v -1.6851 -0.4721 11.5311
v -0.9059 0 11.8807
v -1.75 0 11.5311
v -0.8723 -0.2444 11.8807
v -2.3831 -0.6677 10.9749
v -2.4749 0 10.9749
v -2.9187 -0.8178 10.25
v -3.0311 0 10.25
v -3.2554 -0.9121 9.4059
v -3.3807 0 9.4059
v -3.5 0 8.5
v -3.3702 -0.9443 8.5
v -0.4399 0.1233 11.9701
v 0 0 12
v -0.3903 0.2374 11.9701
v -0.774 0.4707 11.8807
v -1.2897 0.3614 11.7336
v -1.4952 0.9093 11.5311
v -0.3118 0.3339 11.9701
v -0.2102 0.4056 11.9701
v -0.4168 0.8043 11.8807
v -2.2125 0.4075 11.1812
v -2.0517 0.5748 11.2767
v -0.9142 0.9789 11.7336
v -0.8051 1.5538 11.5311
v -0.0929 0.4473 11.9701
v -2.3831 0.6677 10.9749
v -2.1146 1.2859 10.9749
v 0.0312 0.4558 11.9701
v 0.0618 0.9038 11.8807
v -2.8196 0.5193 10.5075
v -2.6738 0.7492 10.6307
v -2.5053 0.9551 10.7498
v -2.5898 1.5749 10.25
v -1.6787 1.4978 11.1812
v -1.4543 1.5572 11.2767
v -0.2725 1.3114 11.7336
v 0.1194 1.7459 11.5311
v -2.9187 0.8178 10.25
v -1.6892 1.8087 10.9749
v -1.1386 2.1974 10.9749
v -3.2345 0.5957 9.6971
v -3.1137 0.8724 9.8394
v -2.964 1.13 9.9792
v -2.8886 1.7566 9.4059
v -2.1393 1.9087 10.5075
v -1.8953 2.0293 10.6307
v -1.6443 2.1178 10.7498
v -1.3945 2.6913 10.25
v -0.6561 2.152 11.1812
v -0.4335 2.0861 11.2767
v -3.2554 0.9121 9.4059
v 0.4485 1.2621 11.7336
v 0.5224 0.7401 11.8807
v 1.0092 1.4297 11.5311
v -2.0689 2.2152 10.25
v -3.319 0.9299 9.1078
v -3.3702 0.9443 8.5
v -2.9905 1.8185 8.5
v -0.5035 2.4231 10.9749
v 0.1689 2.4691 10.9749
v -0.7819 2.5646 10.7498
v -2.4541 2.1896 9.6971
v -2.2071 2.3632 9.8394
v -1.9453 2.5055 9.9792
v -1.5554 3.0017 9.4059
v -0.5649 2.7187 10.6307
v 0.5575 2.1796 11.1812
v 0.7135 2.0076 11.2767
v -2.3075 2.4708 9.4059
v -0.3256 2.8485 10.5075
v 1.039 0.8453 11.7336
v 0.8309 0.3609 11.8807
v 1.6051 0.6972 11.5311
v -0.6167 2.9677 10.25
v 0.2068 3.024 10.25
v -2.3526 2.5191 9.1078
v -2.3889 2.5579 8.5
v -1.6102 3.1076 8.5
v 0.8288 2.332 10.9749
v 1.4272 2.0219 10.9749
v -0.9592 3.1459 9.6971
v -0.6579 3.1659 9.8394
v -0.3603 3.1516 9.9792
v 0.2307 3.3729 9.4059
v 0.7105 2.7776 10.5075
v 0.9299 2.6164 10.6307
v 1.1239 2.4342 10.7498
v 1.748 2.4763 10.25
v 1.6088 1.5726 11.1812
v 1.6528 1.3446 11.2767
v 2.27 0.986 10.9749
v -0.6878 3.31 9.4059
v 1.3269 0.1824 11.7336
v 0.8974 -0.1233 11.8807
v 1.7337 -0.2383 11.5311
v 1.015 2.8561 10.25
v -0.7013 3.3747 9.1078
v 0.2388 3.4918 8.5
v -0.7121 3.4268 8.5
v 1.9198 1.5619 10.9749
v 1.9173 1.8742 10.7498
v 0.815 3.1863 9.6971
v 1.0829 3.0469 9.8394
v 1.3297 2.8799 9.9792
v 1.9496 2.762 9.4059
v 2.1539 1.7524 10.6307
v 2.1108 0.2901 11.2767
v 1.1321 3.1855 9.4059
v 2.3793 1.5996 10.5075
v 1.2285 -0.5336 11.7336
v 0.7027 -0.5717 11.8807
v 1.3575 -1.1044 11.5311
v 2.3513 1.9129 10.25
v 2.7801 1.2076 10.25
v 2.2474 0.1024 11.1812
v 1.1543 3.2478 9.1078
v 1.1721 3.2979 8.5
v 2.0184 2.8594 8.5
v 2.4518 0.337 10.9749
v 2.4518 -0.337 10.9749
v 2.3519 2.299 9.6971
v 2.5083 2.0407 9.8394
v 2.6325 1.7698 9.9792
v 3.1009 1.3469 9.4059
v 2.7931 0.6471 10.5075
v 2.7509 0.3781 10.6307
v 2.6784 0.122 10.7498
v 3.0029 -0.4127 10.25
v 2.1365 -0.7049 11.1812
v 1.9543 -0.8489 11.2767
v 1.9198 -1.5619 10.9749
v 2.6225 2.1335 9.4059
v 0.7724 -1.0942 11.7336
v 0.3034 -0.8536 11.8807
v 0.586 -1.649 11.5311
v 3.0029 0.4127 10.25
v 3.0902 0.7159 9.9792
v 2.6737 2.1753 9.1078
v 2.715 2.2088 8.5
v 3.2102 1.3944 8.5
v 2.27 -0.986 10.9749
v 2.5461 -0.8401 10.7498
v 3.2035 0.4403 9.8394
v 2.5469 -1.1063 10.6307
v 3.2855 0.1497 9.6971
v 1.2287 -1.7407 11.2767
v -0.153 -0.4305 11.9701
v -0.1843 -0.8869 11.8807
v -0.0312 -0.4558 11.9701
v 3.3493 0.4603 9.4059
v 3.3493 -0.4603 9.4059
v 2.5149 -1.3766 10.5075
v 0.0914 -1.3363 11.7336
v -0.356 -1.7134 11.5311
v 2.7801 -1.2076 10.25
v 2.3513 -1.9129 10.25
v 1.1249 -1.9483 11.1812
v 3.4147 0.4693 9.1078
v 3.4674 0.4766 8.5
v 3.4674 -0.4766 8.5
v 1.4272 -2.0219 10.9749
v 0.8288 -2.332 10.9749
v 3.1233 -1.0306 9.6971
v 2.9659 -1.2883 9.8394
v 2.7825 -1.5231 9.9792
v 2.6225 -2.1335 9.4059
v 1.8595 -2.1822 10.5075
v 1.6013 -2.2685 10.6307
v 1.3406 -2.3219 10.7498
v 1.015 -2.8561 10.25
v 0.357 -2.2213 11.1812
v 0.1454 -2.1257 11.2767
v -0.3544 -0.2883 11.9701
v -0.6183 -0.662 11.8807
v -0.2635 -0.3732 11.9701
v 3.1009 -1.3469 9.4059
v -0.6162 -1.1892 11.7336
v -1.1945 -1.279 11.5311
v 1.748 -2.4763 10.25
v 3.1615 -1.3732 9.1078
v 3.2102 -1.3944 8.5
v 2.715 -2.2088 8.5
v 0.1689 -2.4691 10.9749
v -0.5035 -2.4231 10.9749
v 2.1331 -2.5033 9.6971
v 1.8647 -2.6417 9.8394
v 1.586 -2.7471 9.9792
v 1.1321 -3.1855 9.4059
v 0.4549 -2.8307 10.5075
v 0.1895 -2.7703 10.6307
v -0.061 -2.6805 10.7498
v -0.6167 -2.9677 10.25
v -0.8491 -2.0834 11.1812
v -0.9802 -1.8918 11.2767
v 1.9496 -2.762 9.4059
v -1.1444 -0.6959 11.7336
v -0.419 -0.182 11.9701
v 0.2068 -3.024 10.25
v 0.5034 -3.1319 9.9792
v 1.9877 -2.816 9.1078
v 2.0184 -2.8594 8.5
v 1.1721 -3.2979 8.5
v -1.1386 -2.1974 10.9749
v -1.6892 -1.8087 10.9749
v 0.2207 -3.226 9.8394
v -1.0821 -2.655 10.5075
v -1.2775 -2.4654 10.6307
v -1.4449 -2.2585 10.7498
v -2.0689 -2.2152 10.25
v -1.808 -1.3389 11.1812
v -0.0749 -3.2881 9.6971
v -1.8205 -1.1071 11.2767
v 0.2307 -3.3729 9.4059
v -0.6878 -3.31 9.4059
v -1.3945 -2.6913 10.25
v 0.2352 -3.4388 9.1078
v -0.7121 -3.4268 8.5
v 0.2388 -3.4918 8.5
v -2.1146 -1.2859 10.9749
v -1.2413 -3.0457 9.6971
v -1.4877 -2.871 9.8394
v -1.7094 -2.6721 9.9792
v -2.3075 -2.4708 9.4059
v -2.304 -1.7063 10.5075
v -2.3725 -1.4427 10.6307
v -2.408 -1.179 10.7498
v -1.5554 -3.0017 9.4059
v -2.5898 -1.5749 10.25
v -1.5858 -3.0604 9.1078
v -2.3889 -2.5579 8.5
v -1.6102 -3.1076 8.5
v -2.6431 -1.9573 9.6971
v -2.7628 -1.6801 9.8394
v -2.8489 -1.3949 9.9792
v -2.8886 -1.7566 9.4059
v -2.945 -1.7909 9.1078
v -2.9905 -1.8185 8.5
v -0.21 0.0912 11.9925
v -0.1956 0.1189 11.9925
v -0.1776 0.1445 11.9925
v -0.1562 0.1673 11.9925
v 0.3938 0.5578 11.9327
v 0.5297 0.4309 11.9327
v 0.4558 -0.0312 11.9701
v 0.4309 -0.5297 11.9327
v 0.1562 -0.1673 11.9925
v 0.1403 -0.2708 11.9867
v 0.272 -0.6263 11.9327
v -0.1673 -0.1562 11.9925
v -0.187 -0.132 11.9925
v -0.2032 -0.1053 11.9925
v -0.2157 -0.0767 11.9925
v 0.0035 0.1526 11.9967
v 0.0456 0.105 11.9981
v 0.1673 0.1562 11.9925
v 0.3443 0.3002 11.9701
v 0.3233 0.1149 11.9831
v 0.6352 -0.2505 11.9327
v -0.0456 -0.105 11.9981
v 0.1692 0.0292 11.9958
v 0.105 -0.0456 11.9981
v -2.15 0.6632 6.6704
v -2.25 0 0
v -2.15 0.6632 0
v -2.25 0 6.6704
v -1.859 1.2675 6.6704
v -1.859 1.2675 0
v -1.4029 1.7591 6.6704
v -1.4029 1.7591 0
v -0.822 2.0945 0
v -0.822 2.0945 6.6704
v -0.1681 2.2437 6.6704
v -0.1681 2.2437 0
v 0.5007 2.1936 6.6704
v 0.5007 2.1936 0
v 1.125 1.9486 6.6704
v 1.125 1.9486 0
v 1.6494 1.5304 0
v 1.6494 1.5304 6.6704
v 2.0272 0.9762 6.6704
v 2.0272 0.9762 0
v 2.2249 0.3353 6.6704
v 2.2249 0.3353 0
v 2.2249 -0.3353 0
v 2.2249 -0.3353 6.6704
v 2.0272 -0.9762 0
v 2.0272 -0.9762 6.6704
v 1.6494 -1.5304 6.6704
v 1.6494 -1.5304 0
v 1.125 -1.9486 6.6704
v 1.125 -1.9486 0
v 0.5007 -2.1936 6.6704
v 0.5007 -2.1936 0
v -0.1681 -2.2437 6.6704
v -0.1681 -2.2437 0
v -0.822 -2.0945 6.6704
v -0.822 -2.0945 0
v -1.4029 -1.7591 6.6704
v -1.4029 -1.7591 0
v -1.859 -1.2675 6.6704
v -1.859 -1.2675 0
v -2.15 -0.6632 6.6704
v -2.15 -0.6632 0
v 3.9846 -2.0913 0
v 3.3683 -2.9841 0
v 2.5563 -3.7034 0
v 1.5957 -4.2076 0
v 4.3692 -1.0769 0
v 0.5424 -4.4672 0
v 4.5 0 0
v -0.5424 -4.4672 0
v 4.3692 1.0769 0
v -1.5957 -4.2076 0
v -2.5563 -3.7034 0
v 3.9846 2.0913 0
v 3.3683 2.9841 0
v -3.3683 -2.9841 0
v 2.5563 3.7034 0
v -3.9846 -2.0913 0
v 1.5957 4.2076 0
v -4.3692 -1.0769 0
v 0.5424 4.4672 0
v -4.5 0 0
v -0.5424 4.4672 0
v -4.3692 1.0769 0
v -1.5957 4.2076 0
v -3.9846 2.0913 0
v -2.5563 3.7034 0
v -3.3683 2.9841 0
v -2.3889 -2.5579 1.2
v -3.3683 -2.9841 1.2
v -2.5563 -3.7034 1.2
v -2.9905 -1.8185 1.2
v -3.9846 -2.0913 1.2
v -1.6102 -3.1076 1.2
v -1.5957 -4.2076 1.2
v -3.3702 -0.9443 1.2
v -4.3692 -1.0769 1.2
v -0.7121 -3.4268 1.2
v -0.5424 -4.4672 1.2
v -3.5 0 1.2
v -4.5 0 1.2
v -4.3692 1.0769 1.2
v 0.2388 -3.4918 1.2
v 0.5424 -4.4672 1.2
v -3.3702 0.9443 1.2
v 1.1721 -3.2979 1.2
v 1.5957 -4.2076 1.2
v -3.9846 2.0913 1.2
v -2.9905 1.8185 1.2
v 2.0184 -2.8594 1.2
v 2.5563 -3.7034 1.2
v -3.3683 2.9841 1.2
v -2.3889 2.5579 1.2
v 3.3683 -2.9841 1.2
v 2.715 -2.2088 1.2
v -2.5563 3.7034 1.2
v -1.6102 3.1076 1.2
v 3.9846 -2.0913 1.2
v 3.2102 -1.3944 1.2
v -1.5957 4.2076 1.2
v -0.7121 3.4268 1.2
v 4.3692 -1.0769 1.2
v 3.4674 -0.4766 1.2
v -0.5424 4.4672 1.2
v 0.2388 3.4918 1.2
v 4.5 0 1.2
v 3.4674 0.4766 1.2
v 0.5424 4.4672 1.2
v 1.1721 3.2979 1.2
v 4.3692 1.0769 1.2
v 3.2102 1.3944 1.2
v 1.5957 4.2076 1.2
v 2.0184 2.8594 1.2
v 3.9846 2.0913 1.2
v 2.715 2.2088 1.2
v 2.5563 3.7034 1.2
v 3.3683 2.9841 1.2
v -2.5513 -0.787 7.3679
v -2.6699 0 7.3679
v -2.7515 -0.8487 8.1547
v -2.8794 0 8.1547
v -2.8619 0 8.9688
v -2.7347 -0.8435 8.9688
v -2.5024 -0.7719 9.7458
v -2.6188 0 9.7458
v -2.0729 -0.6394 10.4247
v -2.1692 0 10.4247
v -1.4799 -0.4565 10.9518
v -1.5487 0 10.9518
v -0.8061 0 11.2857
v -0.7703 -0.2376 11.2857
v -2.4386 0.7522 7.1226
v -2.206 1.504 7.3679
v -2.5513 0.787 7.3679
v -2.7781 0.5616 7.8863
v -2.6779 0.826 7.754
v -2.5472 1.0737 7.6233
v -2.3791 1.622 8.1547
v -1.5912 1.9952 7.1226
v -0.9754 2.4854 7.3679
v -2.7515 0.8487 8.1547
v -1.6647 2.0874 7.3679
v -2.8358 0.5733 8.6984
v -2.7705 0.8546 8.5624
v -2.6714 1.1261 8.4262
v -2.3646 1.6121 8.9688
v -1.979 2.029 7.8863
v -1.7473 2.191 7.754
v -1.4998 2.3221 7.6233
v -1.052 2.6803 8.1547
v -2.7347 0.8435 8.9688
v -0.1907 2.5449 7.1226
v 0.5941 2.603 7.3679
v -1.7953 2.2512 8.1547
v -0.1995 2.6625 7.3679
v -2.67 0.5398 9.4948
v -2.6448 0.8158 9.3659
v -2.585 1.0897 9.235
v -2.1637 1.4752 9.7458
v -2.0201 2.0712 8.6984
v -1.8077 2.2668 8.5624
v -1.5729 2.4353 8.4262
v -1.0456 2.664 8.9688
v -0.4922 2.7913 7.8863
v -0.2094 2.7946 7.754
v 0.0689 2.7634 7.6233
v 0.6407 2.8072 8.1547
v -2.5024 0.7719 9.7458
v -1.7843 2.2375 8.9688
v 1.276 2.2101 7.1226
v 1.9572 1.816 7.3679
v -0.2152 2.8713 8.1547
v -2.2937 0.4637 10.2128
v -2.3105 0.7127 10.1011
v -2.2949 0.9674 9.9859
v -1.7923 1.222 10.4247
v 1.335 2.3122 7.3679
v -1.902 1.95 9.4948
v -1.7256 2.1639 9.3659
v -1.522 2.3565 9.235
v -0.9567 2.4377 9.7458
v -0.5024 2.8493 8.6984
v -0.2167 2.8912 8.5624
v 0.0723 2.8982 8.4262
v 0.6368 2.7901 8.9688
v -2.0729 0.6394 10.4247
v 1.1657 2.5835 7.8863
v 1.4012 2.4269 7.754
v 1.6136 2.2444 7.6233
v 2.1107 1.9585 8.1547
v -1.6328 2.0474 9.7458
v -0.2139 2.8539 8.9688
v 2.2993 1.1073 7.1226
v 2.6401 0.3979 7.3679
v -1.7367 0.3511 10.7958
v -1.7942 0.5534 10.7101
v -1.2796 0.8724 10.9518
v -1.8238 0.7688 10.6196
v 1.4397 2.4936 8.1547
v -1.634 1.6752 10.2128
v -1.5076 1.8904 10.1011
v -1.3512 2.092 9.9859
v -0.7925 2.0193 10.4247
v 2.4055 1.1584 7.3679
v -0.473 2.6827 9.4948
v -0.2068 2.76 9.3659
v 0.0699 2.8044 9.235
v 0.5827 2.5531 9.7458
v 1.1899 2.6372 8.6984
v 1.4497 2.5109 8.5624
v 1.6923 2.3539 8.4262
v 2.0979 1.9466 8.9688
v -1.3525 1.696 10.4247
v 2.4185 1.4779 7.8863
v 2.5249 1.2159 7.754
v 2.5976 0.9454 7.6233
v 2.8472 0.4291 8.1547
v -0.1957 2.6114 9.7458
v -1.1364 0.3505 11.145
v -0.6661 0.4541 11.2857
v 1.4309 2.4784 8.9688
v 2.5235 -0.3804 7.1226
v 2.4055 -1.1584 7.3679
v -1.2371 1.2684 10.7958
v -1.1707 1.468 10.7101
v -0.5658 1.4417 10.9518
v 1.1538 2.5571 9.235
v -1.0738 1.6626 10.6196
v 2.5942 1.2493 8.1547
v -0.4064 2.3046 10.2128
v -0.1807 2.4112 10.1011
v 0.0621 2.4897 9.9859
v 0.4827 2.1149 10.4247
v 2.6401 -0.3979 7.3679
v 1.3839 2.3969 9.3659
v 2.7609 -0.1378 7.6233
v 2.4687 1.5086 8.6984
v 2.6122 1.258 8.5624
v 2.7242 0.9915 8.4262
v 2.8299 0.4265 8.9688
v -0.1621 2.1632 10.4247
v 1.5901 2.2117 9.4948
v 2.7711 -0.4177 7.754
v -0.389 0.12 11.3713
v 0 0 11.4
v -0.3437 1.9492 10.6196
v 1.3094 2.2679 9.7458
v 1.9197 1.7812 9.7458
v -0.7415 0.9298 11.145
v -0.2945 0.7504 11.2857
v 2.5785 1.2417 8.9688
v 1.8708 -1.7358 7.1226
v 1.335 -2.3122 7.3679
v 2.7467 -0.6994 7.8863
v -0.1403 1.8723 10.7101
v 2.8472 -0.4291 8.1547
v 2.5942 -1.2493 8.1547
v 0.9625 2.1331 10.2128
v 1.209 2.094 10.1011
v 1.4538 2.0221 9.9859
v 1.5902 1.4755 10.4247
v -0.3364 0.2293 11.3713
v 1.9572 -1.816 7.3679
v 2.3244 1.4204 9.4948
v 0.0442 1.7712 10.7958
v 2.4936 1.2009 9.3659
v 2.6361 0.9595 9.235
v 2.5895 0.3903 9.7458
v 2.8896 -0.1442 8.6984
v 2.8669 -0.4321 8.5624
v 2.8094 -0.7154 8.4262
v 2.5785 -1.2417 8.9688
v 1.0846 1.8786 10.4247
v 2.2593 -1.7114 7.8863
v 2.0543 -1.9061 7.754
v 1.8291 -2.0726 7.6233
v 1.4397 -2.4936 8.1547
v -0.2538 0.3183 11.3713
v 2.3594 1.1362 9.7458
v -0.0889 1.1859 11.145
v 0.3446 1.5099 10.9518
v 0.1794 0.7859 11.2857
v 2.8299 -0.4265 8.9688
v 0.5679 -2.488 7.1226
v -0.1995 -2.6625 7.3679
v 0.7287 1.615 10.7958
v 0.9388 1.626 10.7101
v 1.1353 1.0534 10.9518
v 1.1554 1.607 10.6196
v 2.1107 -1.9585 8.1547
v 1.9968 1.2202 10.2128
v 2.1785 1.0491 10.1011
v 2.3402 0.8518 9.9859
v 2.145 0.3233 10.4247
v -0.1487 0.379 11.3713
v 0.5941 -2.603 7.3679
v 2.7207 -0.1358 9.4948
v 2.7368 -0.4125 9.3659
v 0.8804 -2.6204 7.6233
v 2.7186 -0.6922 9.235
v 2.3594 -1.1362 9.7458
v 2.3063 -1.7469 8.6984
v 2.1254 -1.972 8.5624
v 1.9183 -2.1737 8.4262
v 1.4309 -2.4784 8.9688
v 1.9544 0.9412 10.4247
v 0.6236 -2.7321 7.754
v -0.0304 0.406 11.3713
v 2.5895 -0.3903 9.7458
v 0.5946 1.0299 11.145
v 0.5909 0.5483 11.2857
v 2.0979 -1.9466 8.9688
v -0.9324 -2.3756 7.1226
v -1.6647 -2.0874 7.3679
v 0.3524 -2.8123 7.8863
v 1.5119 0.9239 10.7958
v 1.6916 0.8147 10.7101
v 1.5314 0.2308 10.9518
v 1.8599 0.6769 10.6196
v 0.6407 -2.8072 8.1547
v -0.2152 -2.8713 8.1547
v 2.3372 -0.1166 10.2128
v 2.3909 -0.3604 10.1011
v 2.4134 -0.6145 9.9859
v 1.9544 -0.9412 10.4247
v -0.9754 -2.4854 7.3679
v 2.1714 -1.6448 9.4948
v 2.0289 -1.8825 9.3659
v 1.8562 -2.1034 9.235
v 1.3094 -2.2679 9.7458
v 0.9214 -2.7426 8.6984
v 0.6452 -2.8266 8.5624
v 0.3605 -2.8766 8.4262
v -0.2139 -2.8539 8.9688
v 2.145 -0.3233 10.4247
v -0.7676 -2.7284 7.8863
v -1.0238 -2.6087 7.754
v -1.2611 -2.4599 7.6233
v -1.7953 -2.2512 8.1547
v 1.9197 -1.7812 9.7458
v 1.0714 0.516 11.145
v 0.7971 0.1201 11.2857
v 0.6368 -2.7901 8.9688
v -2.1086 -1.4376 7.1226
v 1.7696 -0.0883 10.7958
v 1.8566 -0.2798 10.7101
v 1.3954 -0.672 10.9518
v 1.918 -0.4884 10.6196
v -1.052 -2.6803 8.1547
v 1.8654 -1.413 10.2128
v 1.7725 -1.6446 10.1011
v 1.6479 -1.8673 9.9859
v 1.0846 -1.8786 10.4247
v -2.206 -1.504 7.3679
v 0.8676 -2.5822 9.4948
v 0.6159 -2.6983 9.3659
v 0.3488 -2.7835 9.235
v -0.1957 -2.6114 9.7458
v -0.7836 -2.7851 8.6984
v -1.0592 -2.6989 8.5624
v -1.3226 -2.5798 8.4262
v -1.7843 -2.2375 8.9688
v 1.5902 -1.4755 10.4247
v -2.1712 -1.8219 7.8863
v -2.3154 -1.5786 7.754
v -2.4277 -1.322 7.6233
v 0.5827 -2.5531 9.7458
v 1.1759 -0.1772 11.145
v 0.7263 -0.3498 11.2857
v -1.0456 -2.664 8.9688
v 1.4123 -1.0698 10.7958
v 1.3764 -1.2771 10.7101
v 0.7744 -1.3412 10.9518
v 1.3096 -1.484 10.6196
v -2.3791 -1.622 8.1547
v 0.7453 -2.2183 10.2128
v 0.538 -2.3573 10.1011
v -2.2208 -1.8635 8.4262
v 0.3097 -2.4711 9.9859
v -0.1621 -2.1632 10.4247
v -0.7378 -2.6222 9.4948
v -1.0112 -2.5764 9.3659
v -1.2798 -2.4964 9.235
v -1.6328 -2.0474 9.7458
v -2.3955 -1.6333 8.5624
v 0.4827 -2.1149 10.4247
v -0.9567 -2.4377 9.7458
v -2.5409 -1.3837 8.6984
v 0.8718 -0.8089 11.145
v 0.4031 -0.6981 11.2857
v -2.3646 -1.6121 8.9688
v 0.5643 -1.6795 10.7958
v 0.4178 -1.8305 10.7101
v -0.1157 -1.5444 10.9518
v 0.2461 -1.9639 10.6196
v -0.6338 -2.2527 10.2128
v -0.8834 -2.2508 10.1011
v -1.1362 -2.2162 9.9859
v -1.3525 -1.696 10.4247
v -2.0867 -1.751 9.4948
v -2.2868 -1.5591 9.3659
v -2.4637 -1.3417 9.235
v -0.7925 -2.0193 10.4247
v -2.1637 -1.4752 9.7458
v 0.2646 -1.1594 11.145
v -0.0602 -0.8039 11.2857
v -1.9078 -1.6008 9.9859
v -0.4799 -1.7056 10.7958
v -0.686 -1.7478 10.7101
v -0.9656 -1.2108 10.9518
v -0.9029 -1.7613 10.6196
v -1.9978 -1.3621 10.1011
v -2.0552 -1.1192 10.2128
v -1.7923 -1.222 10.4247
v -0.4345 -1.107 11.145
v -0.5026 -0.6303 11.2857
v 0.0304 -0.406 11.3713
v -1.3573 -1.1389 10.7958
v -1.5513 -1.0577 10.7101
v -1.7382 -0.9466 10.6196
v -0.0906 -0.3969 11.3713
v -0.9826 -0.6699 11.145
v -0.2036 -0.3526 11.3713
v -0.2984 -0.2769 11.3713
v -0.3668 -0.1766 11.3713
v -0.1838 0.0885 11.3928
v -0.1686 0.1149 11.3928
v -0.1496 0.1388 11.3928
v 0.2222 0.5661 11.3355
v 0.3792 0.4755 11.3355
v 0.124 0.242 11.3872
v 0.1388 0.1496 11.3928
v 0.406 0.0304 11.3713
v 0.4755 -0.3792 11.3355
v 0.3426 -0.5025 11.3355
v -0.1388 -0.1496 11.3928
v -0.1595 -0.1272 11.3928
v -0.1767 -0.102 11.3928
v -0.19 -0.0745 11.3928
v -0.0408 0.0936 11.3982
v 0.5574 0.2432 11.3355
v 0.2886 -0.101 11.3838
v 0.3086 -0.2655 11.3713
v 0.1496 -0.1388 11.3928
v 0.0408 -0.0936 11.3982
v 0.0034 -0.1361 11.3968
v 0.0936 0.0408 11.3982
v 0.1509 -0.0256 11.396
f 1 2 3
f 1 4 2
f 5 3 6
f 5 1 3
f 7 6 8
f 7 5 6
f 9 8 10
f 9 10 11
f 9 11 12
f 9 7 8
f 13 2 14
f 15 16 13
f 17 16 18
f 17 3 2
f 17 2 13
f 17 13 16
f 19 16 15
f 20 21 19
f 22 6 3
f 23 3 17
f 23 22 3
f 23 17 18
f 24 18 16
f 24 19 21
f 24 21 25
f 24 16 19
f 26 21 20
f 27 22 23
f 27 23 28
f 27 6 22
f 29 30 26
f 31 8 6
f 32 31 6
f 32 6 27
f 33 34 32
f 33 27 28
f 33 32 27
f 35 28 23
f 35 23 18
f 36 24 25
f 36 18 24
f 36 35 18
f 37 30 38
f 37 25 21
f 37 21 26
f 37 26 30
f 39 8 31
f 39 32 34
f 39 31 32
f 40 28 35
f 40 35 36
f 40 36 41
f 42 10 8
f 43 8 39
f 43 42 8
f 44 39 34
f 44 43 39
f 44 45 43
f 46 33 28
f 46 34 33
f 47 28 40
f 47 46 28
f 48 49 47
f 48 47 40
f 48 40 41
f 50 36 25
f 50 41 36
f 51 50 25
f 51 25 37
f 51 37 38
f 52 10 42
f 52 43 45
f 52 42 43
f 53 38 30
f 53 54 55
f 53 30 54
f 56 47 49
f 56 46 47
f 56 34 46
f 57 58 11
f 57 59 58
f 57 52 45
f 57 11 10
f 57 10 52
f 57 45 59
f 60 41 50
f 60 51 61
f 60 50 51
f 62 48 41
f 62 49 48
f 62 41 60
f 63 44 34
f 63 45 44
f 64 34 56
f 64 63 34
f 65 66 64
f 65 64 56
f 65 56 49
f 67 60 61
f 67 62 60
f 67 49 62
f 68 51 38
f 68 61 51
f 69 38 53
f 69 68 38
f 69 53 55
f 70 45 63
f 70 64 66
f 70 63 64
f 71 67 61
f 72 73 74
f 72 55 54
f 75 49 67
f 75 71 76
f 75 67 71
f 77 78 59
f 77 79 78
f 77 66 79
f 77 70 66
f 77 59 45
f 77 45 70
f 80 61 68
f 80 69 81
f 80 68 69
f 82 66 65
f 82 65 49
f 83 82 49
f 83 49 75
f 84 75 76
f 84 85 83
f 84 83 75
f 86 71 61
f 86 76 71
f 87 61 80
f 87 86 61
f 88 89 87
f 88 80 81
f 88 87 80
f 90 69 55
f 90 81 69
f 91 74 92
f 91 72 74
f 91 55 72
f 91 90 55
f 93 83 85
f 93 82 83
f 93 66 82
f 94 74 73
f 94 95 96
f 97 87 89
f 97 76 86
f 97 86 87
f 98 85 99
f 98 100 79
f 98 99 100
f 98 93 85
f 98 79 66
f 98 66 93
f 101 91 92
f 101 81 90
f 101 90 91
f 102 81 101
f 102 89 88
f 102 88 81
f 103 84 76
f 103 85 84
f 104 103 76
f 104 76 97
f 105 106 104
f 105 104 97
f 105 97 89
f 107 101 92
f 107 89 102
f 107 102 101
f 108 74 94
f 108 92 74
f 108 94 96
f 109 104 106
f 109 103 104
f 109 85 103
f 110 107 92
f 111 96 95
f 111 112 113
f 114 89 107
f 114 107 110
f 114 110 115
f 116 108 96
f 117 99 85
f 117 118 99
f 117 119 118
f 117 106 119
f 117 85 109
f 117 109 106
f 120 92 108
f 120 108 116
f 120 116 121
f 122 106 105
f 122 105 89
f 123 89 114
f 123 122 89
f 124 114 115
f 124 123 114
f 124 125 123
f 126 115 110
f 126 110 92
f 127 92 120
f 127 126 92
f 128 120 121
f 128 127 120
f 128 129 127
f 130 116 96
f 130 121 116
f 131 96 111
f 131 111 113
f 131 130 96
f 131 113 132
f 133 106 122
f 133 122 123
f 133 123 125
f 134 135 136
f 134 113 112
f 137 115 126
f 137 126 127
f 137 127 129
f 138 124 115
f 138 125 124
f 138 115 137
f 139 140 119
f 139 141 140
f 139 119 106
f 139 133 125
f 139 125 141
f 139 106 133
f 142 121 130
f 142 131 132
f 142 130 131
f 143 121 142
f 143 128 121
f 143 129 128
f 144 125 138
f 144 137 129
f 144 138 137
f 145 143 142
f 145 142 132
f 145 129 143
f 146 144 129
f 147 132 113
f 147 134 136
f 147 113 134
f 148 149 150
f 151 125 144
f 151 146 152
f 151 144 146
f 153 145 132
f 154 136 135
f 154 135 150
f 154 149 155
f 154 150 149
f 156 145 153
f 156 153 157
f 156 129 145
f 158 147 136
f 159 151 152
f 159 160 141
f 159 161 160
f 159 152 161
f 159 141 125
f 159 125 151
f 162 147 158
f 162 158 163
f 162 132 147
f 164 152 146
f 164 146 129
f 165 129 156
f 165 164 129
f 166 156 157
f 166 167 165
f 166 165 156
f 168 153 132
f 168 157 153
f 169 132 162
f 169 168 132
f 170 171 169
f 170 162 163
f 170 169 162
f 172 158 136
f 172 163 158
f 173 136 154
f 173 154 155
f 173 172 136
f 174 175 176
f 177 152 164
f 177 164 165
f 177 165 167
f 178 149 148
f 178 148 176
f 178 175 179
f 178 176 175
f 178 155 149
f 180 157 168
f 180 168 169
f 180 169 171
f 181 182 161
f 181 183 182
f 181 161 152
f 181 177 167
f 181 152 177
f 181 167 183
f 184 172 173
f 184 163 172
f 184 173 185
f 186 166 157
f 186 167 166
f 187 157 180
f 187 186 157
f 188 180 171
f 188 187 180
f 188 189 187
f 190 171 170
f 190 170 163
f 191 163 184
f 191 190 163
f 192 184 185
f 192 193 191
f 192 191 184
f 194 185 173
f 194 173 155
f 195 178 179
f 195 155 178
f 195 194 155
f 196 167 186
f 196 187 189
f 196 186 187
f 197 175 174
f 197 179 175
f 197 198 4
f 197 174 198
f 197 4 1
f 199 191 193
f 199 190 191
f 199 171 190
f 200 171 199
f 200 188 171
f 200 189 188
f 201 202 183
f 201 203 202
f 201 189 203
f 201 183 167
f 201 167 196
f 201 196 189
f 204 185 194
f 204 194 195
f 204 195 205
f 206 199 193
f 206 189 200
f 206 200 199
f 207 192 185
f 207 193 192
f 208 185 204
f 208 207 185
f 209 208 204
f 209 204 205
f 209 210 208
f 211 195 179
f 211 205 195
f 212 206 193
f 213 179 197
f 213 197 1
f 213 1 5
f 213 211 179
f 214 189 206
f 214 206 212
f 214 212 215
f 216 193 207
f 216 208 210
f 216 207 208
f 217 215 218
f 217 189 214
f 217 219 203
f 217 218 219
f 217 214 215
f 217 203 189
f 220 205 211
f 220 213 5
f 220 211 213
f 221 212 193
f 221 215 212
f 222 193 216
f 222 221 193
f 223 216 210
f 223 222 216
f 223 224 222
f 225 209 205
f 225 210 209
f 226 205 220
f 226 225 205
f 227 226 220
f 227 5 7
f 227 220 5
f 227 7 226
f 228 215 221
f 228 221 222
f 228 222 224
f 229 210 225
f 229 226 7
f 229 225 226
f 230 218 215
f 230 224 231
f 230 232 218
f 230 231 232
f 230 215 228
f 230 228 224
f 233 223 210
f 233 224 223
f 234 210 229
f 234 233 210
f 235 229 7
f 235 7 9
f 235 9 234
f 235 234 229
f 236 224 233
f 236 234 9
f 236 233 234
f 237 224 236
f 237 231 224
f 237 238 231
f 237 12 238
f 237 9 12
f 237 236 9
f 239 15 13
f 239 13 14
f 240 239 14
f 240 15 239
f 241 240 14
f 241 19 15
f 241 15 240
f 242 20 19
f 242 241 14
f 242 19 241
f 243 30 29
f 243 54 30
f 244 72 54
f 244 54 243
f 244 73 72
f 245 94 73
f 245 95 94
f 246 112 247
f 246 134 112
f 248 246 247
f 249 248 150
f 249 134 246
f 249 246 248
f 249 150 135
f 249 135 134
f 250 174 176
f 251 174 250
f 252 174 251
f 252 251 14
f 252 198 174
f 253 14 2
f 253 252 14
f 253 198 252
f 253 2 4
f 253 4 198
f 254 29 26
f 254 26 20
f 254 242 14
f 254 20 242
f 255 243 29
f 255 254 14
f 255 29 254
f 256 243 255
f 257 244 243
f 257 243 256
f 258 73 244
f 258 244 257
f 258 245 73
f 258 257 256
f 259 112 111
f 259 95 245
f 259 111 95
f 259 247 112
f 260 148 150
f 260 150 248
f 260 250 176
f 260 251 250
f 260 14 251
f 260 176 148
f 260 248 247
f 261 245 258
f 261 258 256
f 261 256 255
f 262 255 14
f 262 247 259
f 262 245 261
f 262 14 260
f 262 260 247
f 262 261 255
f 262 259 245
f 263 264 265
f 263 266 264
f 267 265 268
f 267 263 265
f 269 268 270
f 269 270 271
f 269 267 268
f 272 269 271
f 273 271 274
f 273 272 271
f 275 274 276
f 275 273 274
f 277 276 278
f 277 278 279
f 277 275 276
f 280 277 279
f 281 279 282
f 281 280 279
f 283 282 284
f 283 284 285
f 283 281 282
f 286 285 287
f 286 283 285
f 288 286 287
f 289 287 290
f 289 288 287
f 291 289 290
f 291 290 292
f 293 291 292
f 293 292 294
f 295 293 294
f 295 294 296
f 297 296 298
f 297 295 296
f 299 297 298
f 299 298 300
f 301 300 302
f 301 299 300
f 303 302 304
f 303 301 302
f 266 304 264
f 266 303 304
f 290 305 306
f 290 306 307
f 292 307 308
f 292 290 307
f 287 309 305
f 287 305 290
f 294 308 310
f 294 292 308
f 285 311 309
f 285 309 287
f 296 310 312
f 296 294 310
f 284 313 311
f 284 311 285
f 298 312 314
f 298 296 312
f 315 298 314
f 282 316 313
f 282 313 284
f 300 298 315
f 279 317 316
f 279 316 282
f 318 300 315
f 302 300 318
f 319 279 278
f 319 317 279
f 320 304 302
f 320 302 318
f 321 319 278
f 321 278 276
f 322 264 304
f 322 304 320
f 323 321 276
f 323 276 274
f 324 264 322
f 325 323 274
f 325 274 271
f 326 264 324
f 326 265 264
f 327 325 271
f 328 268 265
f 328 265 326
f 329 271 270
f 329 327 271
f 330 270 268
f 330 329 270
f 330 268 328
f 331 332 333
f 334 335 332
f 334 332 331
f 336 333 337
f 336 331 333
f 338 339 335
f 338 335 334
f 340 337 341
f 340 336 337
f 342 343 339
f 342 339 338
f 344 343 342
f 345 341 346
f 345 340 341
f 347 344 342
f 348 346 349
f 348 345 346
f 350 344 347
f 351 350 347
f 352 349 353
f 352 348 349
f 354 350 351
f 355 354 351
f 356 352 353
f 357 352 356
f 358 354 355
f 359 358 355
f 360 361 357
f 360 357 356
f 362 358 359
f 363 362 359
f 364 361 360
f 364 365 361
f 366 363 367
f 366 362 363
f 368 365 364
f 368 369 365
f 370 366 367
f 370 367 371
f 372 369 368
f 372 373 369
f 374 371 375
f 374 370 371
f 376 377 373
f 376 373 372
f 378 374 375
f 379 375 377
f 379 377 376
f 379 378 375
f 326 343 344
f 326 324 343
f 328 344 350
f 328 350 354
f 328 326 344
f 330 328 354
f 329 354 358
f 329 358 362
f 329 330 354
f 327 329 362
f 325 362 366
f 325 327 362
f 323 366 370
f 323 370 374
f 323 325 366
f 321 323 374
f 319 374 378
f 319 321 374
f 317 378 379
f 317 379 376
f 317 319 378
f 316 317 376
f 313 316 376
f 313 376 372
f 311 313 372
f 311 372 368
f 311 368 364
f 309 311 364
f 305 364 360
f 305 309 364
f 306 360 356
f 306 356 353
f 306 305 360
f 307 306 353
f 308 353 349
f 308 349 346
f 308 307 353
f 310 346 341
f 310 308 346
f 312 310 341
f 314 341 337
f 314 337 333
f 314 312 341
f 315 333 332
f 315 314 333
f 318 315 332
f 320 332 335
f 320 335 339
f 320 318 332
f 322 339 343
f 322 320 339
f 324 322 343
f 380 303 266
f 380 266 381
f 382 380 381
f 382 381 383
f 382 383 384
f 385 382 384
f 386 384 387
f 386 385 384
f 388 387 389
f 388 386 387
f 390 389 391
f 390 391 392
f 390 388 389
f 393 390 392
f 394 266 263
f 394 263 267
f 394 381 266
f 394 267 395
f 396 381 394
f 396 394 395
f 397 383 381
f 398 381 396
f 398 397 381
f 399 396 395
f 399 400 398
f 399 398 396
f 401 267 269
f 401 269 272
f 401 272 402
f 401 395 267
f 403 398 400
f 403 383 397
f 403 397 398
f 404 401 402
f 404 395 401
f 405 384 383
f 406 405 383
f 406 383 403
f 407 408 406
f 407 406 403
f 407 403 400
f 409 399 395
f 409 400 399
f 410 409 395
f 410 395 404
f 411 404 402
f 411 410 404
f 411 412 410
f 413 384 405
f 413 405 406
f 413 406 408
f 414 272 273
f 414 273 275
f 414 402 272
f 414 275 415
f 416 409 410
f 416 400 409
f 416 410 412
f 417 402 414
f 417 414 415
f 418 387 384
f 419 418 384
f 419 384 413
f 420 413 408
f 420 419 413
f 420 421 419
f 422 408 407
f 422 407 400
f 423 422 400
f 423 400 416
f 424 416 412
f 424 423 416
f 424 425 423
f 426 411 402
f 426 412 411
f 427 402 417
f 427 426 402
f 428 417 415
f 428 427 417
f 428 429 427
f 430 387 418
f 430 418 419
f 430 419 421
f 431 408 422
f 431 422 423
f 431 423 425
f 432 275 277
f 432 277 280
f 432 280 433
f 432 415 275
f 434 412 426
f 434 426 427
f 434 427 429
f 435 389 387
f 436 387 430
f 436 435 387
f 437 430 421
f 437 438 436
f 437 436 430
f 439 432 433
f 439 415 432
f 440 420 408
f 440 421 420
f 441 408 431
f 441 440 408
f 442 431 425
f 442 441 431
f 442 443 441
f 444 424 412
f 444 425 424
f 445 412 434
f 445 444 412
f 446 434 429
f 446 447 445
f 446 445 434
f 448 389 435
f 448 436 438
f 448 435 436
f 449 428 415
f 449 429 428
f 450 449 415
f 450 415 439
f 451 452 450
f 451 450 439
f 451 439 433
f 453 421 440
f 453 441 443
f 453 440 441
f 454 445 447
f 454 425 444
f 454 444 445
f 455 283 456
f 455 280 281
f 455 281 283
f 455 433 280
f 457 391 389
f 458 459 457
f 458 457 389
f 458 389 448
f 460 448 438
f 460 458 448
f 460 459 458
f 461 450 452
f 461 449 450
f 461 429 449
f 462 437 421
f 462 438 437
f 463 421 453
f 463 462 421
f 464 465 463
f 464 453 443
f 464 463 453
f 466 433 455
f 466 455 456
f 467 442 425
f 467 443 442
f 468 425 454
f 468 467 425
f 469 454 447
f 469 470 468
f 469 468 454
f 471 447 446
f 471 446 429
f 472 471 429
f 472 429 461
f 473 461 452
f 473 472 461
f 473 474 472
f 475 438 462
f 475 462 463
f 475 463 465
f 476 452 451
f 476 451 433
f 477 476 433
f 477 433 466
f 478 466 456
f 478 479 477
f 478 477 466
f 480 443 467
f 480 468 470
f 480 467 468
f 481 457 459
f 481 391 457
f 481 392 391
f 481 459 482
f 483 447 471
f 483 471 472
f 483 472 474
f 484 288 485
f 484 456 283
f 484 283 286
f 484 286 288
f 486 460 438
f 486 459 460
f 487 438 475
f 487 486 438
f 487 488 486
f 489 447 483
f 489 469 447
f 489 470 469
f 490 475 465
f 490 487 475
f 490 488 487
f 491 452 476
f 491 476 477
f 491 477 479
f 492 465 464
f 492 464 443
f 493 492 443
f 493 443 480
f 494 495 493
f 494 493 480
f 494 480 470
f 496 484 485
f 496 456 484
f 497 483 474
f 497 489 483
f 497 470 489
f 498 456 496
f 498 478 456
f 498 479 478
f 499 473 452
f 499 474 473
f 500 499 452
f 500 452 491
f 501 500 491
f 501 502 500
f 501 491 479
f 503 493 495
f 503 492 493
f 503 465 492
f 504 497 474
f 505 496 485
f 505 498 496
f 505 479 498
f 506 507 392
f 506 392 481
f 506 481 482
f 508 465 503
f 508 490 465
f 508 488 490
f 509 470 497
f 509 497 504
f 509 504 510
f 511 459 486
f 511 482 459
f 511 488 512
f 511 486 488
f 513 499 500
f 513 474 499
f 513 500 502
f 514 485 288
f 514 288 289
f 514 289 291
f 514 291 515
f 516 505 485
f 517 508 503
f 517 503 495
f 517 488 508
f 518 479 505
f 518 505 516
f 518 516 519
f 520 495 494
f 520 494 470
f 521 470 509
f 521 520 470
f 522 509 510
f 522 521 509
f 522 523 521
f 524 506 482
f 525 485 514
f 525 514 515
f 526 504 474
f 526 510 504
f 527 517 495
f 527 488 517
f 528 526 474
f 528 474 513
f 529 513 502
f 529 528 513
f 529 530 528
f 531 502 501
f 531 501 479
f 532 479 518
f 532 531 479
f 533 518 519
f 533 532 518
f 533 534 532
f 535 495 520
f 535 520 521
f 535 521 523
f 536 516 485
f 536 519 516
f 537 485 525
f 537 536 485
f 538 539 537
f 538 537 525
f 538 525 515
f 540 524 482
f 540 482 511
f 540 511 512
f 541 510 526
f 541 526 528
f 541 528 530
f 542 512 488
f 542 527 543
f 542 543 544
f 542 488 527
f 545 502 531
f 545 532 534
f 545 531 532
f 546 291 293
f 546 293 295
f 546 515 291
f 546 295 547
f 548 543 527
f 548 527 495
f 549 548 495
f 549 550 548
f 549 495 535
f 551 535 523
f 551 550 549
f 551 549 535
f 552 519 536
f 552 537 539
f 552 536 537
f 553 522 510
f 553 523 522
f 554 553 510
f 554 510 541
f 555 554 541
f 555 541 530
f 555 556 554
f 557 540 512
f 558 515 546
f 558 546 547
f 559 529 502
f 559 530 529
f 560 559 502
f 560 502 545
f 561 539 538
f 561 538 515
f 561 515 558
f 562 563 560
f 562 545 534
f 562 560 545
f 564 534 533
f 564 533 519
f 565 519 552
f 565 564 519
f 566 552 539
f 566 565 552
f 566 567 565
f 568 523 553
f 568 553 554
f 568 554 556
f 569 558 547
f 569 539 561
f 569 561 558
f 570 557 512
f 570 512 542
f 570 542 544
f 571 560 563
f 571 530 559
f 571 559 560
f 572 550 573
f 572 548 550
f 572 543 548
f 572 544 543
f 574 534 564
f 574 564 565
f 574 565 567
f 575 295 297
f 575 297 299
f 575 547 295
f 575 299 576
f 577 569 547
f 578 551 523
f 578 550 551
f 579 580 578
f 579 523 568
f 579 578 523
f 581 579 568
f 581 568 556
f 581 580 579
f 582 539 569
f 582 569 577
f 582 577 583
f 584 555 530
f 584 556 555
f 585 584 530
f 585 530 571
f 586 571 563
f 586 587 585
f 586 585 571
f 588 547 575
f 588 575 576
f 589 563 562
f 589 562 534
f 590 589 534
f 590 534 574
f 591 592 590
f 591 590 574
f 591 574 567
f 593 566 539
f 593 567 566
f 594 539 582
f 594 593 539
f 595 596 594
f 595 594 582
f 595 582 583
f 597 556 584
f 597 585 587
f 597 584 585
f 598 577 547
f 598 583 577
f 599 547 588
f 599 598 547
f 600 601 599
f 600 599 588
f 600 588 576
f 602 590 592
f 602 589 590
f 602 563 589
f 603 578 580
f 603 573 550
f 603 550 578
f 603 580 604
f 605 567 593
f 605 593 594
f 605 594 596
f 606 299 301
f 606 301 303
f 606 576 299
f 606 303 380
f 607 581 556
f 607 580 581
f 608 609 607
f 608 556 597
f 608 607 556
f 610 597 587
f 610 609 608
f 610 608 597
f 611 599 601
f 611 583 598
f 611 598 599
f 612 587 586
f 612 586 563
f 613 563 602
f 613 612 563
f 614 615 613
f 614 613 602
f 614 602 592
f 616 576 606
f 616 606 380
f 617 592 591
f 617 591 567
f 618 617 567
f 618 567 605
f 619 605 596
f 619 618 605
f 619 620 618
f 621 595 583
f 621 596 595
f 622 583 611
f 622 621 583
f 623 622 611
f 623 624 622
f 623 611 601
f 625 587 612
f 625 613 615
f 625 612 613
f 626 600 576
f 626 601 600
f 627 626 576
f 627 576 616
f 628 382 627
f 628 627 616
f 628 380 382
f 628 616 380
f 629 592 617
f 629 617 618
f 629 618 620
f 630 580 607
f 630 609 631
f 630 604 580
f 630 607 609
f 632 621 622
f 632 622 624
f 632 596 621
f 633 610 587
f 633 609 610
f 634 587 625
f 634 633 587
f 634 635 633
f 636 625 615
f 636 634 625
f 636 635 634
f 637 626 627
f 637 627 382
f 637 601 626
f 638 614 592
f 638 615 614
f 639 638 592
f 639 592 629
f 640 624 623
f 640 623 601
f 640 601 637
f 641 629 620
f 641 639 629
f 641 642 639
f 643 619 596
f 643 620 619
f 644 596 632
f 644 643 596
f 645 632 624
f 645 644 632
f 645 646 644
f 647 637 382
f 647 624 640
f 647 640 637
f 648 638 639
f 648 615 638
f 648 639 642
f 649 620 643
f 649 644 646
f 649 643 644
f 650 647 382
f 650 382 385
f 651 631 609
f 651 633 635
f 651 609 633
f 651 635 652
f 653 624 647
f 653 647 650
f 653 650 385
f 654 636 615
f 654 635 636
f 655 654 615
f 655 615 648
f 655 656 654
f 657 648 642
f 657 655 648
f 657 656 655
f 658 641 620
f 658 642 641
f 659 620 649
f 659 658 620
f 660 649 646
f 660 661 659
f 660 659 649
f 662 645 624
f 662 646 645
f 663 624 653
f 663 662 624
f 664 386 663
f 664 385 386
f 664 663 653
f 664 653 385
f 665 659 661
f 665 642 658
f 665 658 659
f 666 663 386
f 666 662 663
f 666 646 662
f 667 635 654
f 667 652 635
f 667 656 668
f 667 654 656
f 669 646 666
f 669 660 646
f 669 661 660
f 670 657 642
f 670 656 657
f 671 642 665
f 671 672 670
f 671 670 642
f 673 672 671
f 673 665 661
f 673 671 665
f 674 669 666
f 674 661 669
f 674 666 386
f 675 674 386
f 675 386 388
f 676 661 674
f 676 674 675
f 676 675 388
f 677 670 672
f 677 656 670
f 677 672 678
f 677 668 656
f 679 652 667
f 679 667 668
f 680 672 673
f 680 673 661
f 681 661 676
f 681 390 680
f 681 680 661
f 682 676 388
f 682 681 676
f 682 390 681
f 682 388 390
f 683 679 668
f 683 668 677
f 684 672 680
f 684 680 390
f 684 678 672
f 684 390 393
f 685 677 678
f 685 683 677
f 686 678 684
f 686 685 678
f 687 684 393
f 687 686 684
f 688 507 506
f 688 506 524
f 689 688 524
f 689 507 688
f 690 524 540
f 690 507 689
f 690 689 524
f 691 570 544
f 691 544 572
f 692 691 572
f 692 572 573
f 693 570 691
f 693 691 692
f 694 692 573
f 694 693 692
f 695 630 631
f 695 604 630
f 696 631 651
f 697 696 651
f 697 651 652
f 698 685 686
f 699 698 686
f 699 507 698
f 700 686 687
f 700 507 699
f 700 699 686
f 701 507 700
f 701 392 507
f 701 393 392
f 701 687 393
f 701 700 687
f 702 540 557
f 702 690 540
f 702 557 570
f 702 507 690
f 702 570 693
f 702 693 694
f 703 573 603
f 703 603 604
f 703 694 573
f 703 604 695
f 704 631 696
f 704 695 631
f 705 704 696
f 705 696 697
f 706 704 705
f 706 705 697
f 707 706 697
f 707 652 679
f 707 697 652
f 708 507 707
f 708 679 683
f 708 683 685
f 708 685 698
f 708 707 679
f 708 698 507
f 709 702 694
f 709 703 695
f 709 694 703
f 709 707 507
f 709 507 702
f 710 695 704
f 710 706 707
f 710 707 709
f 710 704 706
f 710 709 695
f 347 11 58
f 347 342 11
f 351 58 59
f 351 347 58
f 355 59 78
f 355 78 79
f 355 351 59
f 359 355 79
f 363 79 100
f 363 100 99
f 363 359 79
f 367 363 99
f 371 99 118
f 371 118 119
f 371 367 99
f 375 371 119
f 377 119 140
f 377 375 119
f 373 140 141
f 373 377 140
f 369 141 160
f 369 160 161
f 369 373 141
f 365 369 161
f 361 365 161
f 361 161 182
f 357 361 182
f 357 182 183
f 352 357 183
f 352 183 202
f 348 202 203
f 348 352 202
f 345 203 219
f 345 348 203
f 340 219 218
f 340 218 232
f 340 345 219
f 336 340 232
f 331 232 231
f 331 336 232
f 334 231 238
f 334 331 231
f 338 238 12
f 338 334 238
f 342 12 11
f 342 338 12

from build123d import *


with BuildPart() as f1:
    # F0 (on Front) → F1 (revolve)
    with BuildSketch(Plane.XZ):
        with BuildLine():
            Line((-4.5, 1.2), (-4.5, 0))
            Line((-4.5, 0), (-2.25, 0))
            Line((-2.25, 0), (-2.25, 6.670383))
            ThreePointArc((-2.25, 6.670383), (-2.618768, 9.745815), (0, 11.4))
            Line((0, 11.4), (0, 12))
            ThreePointArc((0, 12), (-2.474874, 10.974874), (-3.5, 8.5))
            Line((-3.5, 8.5), (-3.5, 1.2))
            Line((-3.5, 1.2), (-4.5, 1.2))
        make_face()
    revolve(axis=Axis((0, 0, 11.7), (0, 0, -1)))


solid = f1.part
